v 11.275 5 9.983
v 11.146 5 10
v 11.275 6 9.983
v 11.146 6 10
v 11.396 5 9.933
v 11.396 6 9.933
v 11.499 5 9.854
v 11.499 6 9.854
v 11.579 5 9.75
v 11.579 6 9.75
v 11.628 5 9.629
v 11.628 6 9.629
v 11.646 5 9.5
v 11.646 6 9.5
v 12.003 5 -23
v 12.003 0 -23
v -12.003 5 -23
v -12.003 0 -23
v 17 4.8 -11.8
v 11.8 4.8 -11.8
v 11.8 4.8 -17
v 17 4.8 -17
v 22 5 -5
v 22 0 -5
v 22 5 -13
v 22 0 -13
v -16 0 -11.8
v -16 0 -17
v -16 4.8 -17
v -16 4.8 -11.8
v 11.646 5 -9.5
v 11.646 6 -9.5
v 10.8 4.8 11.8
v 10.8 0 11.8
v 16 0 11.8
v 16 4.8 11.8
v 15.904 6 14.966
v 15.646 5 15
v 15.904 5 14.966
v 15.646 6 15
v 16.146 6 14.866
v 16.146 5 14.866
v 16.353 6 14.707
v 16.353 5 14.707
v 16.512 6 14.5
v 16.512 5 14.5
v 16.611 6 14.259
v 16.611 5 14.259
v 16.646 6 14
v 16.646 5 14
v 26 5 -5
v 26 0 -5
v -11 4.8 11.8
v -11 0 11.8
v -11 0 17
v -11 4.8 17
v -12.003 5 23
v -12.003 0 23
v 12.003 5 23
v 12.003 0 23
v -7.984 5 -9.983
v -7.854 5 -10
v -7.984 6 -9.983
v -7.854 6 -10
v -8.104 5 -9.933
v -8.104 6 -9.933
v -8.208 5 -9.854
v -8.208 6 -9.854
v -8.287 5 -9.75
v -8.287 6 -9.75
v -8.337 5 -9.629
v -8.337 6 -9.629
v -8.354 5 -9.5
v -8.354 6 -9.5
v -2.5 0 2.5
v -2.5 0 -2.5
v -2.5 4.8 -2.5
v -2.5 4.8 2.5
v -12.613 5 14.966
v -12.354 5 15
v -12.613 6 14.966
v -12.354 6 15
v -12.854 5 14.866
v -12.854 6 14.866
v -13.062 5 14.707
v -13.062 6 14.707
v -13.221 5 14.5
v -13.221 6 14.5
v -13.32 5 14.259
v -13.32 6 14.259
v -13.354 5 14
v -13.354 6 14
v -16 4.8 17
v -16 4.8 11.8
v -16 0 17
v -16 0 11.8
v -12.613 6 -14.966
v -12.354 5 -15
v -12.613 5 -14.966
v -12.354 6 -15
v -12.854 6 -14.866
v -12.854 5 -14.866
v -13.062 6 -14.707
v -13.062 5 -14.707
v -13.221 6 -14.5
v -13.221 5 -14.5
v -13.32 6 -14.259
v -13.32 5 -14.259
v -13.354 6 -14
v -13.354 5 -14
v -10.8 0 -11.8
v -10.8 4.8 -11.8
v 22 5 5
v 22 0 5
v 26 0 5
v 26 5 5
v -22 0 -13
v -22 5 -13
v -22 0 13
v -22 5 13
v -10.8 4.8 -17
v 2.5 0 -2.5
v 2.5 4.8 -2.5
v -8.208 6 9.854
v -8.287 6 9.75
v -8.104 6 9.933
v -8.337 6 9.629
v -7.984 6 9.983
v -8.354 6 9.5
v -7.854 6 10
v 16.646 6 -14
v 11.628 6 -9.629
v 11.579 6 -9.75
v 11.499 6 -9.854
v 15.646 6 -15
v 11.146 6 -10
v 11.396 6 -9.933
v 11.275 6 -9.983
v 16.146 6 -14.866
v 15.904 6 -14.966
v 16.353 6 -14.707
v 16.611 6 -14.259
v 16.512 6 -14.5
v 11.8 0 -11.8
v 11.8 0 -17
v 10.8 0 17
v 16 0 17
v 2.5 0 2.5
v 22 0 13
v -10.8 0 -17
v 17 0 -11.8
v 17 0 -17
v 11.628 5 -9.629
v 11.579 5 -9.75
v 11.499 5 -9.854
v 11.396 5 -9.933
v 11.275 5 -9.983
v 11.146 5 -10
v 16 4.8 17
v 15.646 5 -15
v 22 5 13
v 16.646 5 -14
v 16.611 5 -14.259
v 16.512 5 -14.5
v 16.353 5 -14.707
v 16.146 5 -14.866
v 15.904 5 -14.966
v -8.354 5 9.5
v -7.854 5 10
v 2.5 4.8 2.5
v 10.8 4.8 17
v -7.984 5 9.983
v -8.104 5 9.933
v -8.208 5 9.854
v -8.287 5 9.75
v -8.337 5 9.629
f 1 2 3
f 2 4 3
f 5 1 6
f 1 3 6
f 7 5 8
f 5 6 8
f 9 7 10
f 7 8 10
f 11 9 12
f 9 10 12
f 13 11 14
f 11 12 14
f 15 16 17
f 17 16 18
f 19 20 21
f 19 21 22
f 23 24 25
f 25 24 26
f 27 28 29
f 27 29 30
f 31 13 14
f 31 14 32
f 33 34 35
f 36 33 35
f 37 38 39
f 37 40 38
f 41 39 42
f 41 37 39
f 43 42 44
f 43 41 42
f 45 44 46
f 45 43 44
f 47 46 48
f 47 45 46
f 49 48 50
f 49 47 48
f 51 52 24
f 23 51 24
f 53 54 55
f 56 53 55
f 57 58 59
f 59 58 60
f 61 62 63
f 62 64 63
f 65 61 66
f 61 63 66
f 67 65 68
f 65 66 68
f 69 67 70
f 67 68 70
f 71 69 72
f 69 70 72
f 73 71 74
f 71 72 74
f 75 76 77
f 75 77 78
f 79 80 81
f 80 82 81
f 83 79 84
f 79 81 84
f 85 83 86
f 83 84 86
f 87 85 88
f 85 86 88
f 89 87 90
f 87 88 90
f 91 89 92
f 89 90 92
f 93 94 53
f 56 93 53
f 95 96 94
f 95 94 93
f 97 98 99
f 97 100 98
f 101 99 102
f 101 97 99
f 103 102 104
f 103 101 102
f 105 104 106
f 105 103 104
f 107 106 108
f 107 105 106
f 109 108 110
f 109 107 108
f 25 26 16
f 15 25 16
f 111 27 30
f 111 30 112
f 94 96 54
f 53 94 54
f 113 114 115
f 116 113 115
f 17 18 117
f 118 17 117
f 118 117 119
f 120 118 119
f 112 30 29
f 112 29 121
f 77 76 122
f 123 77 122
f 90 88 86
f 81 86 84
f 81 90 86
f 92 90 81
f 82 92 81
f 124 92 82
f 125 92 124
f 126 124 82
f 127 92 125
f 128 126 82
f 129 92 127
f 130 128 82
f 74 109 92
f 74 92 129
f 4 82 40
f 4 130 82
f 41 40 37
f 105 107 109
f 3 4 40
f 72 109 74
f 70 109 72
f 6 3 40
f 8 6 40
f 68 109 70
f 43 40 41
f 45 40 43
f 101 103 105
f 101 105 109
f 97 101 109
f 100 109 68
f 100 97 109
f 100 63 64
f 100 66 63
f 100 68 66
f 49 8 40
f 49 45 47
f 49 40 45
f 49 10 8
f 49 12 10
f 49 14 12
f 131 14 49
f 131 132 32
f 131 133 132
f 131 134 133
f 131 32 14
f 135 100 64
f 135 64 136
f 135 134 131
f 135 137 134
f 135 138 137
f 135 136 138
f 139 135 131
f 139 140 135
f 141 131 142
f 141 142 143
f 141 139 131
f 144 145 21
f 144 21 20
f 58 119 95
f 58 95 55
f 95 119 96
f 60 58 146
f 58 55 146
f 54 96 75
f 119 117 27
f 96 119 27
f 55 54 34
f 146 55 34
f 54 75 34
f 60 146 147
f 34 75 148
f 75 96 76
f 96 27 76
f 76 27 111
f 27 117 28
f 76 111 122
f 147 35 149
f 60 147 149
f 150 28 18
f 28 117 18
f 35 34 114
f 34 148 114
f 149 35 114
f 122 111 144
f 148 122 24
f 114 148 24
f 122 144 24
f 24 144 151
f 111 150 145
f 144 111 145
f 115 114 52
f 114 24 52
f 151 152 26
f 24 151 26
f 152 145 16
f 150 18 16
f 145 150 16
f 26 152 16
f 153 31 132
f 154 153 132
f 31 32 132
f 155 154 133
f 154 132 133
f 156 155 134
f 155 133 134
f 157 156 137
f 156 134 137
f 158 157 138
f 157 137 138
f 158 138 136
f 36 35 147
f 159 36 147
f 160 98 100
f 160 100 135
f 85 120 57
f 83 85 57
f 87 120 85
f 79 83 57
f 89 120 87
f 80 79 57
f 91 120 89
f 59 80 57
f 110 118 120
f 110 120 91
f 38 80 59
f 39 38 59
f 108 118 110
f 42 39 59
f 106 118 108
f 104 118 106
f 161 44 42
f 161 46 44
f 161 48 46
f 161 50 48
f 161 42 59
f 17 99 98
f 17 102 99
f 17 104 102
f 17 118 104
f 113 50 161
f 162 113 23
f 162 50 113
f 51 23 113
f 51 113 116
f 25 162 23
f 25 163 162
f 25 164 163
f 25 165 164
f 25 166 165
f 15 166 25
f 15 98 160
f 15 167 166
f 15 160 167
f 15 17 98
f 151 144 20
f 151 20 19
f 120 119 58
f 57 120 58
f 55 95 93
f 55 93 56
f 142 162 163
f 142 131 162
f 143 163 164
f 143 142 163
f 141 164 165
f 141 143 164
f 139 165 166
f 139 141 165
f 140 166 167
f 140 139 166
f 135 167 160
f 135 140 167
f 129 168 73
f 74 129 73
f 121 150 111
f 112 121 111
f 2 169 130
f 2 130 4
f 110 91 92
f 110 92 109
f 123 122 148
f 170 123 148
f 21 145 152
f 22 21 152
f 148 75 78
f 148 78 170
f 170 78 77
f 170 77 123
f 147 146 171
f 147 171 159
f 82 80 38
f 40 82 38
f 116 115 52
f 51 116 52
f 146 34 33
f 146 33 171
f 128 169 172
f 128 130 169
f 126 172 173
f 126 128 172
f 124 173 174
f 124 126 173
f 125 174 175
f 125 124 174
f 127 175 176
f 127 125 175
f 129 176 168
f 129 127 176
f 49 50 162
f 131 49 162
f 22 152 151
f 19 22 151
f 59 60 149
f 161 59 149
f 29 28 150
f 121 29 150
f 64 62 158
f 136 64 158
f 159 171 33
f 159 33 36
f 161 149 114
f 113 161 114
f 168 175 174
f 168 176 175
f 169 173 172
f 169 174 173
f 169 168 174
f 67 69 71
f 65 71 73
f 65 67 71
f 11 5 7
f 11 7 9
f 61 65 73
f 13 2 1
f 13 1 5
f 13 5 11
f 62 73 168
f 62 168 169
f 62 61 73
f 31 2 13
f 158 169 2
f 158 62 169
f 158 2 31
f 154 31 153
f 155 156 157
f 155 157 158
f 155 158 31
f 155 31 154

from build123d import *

# Parameters (mm, degrees)
BOSS_EXTRU_1_DEPTH      = 5
ESQUISSE2_W             = 30
ESQUISSE2_H             = 30
ESQUISSE2_W_2           = 20
ESQUISSE2_H_2           = 20
BOSS_EXTRU_2_DEPTH      = 1
ESQUISSE3_W             = 5
ESQUISSE3_H             = 5.2
ESQUISSE3_W_2           = 5.2
ESQUISSE3_H_2           = 5
ENL_V_MAT_EXTRU_1_DEPTH = 4.8
CONG_1_R                = 1
CONG_2_R                = 0.5


with BuildPart() as part:
    # Esquisse1 → Boss.-Extru.1 (new body)
    with BuildSketch(Plane(origin=(0, 0, 0), x_dir=(1, 0, 0), z_dir=(0, 1, 0))):
        Polygon((22, 13), (12.003020456, 23), (-12.003020456, 23), (-22, 13), (-22, -13), (-12.003020456, -23), (12.003020456, -23), (22, -13), (22, -5), (26, -5), (26, 5), (22, 5), align=None)
    extrude(amount=BOSS_EXTRU_1_DEPTH)

    # Esquisse2 → Boss.-Extru.2 (add)
    with BuildSketch(Plane(origin=(0, 5, 0), x_dir=(1, 0, 0), z_dir=(0, 1, 0))):
        with Locations((1.645517895, 0)):
            Rectangle(ESQUISSE2_W, ESQUISSE2_H)
        with Locations((1.645517895, 0)):
            Rectangle(ESQUISSE2_W_2, ESQUISSE2_H_2, mode=Mode.SUBTRACT)
    extrude(amount=BOSS_EXTRU_2_DEPTH)

    # Esquisse3 → Enlèv. mat.-Extru.1 (cut)
    with BuildSketch(Plane.XZ):
        with Locations((-13.5, 14.4)):
            Rectangle(ESQUISSE3_W, ESQUISSE3_H)
        with Locations((-13.4, -14.4)):
            Rectangle(ESQUISSE3_W_2, ESQUISSE3_H)
        with Locations((14.4, -14.4)):
            Rectangle(ESQUISSE3_W_2, ESQUISSE3_H)
        with Locations((13.4, 14.4)):
            Rectangle(ESQUISSE3_W_2, ESQUISSE3_H)
        Rectangle(ESQUISSE3_W, ESQUISSE3_H_2)
    extrude(amount=-ENL_V_MAT_EXTRU_1_DEPTH, mode=Mode.SUBTRACT)

    # Congé1
    cong_1_edges = [part.edges().sort_by_distance(p)[0] for p in [
        (16.645517895, 5.5, -15),
        (-13.354482105, 5.5, -15),
        (-13.354482105, 5.5, 15),
        (16.645517895, 5.5, 15),
    ]]
    fillet(cong_1_edges, radius=CONG_1_R)

    # Congé2
    cong_2_edges = [part.edges().sort_by_distance(p)[0] for p in [
        (-8.354482105, 5.5, -10),
        (-8.354482105, 5.5, 10),
        (11.645517895, 5.5, 10),
        (11.645517895, 5.5, -10),
    ]]
    fillet(cong_2_edges, radius=CONG_2_R)


solid = part.part
